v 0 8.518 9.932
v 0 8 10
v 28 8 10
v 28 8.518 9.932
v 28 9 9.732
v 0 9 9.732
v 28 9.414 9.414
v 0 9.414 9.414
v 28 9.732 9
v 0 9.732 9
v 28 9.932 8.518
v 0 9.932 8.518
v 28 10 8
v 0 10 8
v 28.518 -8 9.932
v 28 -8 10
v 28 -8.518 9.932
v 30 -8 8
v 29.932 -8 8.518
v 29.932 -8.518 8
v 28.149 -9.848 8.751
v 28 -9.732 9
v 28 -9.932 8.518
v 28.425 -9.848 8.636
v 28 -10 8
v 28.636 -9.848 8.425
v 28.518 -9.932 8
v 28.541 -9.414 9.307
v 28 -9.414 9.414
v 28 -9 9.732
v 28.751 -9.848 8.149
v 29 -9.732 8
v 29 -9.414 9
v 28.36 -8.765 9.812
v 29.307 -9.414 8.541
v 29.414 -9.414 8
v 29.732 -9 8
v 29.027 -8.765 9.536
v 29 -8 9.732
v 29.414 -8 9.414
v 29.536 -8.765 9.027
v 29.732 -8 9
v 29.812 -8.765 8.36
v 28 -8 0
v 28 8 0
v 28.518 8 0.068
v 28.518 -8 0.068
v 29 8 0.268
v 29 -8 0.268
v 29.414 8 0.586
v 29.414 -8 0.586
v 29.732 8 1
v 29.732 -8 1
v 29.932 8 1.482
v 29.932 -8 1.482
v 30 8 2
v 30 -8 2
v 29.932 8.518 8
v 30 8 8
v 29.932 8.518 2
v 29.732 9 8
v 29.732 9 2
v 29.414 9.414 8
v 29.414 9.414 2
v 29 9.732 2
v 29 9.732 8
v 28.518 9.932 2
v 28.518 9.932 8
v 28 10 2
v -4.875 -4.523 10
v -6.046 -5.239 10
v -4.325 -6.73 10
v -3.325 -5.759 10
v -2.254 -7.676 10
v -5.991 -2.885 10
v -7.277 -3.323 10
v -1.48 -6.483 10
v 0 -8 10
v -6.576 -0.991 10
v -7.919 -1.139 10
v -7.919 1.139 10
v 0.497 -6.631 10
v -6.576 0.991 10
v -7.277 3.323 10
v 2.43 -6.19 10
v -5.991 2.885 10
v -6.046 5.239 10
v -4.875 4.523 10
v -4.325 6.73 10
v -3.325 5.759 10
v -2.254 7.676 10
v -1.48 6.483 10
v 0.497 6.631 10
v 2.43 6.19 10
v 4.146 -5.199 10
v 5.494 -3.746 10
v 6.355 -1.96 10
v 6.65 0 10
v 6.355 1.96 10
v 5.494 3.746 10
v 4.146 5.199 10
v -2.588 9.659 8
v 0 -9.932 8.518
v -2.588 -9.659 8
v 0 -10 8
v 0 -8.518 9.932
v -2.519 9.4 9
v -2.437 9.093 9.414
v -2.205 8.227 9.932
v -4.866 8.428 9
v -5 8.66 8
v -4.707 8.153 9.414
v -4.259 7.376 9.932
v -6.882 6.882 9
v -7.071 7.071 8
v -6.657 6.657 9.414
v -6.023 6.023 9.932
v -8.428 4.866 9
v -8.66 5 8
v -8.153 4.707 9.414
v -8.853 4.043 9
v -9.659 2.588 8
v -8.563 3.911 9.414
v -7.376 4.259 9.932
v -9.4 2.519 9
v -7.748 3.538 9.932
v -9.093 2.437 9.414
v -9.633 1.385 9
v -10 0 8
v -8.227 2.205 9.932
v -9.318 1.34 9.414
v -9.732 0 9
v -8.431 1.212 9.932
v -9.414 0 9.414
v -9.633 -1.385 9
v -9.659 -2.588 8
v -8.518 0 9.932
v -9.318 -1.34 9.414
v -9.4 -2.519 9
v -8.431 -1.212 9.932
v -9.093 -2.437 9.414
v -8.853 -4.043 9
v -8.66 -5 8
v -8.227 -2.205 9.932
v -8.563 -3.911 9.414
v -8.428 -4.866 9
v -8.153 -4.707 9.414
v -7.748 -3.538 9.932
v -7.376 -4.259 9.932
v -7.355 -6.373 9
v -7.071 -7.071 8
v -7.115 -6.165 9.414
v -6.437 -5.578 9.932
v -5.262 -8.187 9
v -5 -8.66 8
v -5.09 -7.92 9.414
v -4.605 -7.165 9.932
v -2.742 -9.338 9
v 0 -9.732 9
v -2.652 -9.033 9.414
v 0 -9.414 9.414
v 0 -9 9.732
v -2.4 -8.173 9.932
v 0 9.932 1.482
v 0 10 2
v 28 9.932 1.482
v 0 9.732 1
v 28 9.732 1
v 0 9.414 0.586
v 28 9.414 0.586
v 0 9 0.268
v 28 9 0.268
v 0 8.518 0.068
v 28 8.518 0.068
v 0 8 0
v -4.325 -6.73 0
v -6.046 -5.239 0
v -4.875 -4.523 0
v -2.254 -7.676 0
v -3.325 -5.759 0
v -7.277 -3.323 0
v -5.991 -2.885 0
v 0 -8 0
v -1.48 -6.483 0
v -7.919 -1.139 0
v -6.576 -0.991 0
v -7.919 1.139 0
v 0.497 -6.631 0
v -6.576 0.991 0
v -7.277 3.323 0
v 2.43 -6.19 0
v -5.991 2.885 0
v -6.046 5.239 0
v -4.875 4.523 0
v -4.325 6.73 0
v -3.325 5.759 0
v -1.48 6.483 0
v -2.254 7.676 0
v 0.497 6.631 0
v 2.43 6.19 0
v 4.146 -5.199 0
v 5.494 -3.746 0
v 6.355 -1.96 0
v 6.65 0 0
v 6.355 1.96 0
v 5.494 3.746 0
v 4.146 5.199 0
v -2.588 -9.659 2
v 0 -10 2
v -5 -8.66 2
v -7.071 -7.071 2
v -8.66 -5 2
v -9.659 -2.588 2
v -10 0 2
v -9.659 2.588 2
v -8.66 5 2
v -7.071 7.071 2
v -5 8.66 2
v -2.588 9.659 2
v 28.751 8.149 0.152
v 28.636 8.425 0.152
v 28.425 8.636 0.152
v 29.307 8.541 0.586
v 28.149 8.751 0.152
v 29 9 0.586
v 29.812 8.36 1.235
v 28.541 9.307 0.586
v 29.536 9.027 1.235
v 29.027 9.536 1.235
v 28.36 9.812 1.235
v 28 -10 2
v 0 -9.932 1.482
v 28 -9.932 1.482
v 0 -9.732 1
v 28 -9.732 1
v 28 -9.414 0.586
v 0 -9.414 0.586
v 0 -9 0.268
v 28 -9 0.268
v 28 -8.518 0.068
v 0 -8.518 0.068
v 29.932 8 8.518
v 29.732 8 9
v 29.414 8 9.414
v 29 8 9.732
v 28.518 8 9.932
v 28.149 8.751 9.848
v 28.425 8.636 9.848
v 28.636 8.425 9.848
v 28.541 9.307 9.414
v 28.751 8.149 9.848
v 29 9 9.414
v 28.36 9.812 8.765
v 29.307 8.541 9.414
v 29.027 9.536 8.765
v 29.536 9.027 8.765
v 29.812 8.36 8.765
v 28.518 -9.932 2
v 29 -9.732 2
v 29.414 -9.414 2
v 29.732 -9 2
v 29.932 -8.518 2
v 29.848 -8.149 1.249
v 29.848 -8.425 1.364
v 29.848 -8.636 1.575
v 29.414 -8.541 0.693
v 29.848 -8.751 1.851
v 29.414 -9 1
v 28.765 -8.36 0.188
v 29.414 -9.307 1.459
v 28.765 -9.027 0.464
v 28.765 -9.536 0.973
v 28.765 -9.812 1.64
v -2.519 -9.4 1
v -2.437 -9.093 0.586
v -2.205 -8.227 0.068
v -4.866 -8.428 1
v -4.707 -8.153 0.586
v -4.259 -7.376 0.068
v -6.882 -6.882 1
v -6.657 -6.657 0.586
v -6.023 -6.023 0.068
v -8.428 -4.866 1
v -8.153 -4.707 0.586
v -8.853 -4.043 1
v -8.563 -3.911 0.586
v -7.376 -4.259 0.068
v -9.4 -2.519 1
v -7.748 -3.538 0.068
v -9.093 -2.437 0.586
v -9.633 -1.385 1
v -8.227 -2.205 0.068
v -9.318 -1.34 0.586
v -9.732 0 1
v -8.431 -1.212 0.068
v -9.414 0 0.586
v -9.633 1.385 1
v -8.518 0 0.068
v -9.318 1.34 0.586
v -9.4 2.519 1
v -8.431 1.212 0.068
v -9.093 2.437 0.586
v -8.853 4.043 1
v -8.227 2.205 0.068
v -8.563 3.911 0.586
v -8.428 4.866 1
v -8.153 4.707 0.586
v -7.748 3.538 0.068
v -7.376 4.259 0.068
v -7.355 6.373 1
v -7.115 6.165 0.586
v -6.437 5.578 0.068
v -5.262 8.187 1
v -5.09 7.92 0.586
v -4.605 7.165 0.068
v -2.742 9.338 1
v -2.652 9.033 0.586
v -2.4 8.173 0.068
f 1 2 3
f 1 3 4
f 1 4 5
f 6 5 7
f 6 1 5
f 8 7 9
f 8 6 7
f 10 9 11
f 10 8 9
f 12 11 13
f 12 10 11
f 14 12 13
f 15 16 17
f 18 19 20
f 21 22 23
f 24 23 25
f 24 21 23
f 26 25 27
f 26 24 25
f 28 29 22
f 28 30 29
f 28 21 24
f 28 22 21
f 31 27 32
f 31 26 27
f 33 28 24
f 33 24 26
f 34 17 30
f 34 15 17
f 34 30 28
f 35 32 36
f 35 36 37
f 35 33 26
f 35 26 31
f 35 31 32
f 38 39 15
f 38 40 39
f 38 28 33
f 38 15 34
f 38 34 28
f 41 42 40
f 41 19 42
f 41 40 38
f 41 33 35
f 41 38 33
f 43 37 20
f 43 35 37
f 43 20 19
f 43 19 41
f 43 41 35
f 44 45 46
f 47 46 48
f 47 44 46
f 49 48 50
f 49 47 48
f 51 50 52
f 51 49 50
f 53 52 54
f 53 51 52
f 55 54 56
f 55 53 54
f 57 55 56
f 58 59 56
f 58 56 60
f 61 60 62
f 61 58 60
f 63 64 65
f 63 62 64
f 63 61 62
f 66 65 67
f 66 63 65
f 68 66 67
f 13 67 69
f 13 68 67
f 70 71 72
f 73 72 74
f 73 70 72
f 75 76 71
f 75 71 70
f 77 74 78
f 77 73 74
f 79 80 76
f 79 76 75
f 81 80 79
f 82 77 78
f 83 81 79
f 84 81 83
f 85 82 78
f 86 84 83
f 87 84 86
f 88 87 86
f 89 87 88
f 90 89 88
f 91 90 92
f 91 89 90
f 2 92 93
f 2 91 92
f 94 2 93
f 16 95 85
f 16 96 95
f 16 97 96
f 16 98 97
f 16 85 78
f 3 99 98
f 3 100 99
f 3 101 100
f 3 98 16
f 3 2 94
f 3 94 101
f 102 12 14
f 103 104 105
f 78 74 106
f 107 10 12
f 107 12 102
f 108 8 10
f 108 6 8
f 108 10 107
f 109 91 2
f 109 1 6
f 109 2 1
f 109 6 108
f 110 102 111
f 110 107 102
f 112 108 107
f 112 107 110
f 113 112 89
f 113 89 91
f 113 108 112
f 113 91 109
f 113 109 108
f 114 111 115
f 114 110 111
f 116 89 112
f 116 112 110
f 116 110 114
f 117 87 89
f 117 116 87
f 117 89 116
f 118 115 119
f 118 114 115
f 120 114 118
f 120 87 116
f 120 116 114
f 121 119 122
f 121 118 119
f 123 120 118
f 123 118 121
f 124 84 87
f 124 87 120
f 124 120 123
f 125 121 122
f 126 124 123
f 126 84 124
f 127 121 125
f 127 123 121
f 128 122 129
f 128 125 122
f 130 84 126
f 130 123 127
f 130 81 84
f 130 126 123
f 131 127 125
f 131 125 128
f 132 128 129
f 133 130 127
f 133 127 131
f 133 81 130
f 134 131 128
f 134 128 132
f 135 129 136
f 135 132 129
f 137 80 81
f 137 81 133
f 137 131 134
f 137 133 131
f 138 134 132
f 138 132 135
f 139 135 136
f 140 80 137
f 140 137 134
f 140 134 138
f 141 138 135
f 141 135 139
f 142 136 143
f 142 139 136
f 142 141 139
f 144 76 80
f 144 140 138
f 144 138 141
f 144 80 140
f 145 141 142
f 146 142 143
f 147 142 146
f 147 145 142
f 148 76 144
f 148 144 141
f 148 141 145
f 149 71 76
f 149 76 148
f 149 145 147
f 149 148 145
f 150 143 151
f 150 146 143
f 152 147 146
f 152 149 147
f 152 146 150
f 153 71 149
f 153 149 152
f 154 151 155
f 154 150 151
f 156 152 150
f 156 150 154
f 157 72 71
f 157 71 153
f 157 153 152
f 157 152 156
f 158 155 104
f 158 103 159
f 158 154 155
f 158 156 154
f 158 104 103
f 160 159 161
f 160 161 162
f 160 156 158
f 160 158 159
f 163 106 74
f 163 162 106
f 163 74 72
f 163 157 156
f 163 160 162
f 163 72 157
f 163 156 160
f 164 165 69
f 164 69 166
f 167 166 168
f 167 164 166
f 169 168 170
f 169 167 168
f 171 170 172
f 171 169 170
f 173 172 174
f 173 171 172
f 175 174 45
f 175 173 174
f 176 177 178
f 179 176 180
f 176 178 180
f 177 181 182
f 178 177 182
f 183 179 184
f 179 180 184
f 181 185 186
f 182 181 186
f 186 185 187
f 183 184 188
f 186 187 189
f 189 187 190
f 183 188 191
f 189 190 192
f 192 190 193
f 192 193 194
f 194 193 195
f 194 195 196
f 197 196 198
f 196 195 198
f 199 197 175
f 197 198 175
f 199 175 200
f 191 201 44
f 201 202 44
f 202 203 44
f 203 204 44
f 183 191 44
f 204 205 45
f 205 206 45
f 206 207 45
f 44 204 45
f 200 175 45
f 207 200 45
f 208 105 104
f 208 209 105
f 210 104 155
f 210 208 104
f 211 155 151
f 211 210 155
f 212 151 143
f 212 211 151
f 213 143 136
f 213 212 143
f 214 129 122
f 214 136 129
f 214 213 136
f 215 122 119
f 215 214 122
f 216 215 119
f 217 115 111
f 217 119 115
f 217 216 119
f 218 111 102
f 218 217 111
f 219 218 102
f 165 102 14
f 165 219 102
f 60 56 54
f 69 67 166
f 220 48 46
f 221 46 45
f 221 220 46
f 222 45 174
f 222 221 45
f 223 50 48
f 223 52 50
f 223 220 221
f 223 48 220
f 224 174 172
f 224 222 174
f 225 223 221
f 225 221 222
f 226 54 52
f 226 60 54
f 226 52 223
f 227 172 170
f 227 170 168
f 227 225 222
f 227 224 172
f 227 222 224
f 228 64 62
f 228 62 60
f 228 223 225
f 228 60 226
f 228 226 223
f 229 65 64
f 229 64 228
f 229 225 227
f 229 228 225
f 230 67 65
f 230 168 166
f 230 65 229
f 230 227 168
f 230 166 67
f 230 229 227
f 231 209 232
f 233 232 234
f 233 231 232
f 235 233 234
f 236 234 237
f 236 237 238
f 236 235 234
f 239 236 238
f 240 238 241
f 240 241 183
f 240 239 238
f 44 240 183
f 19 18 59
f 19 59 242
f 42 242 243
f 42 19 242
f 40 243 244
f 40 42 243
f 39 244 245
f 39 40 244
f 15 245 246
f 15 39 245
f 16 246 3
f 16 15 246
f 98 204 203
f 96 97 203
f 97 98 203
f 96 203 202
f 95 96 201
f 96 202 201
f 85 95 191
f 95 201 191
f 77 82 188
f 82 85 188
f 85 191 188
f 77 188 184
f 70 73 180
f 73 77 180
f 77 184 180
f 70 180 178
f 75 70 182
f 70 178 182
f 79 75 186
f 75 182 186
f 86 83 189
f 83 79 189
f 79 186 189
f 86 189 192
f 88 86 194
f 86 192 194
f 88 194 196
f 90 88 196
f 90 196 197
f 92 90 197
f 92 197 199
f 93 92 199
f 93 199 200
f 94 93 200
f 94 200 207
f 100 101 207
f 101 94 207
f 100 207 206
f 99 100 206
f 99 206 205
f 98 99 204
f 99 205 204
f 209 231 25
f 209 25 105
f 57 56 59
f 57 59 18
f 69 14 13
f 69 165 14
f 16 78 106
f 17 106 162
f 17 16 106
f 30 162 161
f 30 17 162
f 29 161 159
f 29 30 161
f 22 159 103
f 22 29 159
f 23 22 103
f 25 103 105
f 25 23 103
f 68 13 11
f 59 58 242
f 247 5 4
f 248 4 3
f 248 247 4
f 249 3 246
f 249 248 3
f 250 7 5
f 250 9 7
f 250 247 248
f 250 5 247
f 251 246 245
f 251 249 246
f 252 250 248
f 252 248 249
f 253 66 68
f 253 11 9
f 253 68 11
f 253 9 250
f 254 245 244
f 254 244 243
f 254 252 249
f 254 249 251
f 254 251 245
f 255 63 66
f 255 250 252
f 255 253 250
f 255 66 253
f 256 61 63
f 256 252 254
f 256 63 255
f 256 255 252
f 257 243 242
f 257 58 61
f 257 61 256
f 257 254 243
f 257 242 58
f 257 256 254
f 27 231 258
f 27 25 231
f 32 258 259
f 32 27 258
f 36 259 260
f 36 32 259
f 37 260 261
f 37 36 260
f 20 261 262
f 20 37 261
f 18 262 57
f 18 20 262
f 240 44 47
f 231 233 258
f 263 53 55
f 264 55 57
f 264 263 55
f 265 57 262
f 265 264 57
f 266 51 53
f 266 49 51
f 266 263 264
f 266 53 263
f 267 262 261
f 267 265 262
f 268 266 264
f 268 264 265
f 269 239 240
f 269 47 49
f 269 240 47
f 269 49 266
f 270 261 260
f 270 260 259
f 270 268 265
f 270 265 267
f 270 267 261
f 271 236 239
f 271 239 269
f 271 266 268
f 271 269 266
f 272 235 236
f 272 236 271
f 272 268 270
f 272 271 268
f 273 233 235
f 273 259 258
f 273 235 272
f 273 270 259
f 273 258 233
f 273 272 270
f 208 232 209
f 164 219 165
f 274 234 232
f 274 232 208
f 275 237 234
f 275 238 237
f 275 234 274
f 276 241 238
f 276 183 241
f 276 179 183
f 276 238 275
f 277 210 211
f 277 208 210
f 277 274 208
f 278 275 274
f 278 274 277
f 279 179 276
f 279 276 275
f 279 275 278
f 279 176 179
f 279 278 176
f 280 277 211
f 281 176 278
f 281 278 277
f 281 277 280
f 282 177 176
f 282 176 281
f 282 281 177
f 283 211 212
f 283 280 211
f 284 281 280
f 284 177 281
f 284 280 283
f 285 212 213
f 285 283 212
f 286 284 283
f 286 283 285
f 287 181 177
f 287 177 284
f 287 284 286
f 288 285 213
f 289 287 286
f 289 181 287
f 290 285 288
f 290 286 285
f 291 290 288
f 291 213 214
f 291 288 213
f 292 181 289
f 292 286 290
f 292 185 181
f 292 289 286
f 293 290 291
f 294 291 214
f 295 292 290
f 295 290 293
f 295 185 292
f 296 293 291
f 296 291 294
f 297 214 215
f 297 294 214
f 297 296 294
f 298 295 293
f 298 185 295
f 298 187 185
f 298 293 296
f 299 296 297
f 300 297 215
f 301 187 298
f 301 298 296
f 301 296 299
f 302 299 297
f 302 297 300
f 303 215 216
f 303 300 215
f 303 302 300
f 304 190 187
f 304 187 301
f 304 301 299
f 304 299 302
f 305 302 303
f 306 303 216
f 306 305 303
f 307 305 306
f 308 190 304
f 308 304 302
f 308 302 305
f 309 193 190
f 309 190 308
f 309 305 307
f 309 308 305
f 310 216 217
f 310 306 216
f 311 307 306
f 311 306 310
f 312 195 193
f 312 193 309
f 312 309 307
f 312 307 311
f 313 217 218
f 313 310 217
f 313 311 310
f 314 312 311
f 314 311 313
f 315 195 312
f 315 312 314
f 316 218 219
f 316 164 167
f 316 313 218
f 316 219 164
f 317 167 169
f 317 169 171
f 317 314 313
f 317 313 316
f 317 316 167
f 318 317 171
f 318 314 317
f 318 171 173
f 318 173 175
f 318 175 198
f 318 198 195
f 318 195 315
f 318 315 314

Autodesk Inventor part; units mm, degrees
ref_plane "YZ Plane" through (0, 0, 0) normal (1, 0, 0) x (0, 1, 0)
ref_plane "XZ Plane" through (0, 0, 0) normal (0, 1, 0) x (-1, 0, 0)
ref_plane "XY Plane" through (0, 0, 0) normal (0, 0, 1) x (1, 0, 0)
sketch "Sketch1" plane through (0, 0, 0) normal (0, 0, 1) x (1, 0, 0)
  circle A0 centre (0, 0) radius 6.65
  arc A1 (0, 10) -> (0, -10) centre (0, 0) ccw
  line L0 (0, 10) -> (30, 10)
  line L1 (30, 10) -> (30, -10)
  line L2 (30, -10) -> (0, -10)
  dimension "d0" = 13.3
  dimension "d2" = 20
  dimension "d3" = 30
  dimension "d4" = 20
extrude "Extrusion1" add sketch "Sketch1" along normal blind 10
fillet "Fillet1" radius 2 10 edges at (30, 10, 5) (30, 0, 10) (-10, 0, 10) (15, -10, 10) (15, 10, 10) (-10, 0, 0) (15, -10, 0) (15, 10, 0) (30, 0, 0) (30, -10, 5)
